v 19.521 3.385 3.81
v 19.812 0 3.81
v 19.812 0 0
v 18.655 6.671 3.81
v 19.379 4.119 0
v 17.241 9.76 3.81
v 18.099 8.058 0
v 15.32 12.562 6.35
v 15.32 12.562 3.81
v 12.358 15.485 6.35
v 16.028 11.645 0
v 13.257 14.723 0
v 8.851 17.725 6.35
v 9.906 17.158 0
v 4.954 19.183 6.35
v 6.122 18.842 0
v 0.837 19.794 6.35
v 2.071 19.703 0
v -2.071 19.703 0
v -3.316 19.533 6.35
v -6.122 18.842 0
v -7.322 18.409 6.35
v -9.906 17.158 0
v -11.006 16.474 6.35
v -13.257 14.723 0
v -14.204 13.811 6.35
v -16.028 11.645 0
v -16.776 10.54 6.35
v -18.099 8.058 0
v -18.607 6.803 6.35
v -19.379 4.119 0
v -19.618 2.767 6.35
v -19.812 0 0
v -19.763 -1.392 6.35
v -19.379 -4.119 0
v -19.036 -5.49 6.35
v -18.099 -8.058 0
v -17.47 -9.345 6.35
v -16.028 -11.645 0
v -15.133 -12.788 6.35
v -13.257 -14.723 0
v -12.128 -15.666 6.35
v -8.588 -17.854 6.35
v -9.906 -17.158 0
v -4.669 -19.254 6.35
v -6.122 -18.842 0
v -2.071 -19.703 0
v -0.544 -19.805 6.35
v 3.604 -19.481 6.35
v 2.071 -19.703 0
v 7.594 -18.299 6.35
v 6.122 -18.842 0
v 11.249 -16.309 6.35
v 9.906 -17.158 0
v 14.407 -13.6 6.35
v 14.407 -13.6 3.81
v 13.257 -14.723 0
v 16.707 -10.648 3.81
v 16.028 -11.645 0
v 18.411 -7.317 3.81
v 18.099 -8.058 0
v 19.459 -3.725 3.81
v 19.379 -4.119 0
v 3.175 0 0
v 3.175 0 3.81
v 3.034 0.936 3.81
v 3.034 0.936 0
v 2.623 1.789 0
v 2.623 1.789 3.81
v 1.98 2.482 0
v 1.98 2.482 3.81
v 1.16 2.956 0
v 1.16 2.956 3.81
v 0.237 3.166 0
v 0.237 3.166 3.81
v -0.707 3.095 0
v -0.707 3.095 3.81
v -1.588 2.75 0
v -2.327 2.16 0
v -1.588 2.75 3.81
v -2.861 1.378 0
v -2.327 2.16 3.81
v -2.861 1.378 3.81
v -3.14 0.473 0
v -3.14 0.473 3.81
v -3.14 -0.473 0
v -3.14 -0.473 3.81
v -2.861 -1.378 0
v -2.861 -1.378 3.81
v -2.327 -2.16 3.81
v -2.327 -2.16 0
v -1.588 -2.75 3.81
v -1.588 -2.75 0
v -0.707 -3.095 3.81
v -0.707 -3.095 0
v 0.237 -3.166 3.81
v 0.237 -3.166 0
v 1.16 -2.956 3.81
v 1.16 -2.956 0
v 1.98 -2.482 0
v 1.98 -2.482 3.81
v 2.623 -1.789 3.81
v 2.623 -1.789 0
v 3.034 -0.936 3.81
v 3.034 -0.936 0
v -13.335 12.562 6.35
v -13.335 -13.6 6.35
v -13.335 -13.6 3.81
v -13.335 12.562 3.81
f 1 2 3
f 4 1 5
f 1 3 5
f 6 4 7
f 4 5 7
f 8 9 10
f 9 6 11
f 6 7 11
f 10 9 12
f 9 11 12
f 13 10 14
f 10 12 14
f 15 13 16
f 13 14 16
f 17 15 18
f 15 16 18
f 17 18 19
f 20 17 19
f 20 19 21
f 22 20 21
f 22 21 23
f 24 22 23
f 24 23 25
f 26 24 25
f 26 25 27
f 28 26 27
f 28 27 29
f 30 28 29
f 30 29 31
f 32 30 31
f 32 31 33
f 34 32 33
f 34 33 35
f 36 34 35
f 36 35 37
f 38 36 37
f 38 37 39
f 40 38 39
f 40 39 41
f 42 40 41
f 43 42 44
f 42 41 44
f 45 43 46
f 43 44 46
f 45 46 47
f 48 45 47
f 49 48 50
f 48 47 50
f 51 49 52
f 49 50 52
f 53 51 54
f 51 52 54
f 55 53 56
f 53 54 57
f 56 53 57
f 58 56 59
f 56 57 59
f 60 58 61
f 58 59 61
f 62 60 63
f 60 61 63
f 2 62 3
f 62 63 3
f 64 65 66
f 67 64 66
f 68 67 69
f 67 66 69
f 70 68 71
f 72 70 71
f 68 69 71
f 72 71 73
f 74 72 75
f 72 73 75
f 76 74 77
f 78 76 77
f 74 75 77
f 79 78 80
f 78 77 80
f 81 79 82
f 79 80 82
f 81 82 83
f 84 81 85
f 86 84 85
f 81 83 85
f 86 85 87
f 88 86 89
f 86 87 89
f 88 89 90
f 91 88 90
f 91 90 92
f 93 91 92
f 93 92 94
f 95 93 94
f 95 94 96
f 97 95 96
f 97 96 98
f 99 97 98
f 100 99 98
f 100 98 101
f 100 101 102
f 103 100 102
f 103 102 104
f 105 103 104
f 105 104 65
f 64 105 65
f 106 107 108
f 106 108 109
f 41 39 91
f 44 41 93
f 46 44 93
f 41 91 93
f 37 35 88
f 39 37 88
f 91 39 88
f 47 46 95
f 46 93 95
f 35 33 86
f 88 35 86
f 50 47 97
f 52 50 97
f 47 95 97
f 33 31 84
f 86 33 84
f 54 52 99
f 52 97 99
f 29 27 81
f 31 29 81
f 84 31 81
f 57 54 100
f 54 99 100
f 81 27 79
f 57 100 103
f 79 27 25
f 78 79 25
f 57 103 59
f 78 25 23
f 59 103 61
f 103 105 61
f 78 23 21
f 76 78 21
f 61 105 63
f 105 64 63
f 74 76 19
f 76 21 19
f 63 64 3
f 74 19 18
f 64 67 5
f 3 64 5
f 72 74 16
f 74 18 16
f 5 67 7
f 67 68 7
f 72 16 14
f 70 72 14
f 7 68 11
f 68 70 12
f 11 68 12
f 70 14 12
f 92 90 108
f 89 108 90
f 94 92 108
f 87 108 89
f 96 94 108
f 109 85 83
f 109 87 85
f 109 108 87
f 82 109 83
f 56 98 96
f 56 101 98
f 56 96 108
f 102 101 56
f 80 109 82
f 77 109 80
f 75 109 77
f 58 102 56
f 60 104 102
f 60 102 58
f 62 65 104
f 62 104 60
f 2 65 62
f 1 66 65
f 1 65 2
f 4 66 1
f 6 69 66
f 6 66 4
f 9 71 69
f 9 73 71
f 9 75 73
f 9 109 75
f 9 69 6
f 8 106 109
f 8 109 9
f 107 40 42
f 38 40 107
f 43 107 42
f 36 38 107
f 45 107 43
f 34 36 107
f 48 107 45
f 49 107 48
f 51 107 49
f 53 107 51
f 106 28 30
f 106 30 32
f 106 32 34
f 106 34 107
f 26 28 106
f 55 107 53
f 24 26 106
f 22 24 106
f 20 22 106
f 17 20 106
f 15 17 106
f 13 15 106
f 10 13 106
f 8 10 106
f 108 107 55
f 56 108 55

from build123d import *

# Parameters (mm, degrees)
F0_R     = 19.812
F1_DEPTH = 6.35
F2_R     = 3.175
F3_DEPTH = 25.4
F4_W     = 34.29
F4_H     = 26.162
F5_DEPTH = 2.54


with BuildPart() as f1:
    # F0 (on Top) → F1 (new body)
    with BuildSketch(Plane.XY):
        Circle(F0_R)
    extrude(amount=F1_DEPTH)

    # F2 (on face) → F3 (cut)
    with BuildSketch(Plane.XY.offset(6.35)):
        Circle(F2_R)
    extrude(amount=-F3_DEPTH, mode=Mode.SUBTRACT)

    # F4 (on face) → F5 (cut)
    with BuildSketch(Plane.XY.offset(6.35)):
        with Locations((3.81, -0.518704)):
            Rectangle(F4_W, F4_H)
    extrude(amount=-F5_DEPTH, mode=Mode.SUBTRACT)


solid = f1.part
